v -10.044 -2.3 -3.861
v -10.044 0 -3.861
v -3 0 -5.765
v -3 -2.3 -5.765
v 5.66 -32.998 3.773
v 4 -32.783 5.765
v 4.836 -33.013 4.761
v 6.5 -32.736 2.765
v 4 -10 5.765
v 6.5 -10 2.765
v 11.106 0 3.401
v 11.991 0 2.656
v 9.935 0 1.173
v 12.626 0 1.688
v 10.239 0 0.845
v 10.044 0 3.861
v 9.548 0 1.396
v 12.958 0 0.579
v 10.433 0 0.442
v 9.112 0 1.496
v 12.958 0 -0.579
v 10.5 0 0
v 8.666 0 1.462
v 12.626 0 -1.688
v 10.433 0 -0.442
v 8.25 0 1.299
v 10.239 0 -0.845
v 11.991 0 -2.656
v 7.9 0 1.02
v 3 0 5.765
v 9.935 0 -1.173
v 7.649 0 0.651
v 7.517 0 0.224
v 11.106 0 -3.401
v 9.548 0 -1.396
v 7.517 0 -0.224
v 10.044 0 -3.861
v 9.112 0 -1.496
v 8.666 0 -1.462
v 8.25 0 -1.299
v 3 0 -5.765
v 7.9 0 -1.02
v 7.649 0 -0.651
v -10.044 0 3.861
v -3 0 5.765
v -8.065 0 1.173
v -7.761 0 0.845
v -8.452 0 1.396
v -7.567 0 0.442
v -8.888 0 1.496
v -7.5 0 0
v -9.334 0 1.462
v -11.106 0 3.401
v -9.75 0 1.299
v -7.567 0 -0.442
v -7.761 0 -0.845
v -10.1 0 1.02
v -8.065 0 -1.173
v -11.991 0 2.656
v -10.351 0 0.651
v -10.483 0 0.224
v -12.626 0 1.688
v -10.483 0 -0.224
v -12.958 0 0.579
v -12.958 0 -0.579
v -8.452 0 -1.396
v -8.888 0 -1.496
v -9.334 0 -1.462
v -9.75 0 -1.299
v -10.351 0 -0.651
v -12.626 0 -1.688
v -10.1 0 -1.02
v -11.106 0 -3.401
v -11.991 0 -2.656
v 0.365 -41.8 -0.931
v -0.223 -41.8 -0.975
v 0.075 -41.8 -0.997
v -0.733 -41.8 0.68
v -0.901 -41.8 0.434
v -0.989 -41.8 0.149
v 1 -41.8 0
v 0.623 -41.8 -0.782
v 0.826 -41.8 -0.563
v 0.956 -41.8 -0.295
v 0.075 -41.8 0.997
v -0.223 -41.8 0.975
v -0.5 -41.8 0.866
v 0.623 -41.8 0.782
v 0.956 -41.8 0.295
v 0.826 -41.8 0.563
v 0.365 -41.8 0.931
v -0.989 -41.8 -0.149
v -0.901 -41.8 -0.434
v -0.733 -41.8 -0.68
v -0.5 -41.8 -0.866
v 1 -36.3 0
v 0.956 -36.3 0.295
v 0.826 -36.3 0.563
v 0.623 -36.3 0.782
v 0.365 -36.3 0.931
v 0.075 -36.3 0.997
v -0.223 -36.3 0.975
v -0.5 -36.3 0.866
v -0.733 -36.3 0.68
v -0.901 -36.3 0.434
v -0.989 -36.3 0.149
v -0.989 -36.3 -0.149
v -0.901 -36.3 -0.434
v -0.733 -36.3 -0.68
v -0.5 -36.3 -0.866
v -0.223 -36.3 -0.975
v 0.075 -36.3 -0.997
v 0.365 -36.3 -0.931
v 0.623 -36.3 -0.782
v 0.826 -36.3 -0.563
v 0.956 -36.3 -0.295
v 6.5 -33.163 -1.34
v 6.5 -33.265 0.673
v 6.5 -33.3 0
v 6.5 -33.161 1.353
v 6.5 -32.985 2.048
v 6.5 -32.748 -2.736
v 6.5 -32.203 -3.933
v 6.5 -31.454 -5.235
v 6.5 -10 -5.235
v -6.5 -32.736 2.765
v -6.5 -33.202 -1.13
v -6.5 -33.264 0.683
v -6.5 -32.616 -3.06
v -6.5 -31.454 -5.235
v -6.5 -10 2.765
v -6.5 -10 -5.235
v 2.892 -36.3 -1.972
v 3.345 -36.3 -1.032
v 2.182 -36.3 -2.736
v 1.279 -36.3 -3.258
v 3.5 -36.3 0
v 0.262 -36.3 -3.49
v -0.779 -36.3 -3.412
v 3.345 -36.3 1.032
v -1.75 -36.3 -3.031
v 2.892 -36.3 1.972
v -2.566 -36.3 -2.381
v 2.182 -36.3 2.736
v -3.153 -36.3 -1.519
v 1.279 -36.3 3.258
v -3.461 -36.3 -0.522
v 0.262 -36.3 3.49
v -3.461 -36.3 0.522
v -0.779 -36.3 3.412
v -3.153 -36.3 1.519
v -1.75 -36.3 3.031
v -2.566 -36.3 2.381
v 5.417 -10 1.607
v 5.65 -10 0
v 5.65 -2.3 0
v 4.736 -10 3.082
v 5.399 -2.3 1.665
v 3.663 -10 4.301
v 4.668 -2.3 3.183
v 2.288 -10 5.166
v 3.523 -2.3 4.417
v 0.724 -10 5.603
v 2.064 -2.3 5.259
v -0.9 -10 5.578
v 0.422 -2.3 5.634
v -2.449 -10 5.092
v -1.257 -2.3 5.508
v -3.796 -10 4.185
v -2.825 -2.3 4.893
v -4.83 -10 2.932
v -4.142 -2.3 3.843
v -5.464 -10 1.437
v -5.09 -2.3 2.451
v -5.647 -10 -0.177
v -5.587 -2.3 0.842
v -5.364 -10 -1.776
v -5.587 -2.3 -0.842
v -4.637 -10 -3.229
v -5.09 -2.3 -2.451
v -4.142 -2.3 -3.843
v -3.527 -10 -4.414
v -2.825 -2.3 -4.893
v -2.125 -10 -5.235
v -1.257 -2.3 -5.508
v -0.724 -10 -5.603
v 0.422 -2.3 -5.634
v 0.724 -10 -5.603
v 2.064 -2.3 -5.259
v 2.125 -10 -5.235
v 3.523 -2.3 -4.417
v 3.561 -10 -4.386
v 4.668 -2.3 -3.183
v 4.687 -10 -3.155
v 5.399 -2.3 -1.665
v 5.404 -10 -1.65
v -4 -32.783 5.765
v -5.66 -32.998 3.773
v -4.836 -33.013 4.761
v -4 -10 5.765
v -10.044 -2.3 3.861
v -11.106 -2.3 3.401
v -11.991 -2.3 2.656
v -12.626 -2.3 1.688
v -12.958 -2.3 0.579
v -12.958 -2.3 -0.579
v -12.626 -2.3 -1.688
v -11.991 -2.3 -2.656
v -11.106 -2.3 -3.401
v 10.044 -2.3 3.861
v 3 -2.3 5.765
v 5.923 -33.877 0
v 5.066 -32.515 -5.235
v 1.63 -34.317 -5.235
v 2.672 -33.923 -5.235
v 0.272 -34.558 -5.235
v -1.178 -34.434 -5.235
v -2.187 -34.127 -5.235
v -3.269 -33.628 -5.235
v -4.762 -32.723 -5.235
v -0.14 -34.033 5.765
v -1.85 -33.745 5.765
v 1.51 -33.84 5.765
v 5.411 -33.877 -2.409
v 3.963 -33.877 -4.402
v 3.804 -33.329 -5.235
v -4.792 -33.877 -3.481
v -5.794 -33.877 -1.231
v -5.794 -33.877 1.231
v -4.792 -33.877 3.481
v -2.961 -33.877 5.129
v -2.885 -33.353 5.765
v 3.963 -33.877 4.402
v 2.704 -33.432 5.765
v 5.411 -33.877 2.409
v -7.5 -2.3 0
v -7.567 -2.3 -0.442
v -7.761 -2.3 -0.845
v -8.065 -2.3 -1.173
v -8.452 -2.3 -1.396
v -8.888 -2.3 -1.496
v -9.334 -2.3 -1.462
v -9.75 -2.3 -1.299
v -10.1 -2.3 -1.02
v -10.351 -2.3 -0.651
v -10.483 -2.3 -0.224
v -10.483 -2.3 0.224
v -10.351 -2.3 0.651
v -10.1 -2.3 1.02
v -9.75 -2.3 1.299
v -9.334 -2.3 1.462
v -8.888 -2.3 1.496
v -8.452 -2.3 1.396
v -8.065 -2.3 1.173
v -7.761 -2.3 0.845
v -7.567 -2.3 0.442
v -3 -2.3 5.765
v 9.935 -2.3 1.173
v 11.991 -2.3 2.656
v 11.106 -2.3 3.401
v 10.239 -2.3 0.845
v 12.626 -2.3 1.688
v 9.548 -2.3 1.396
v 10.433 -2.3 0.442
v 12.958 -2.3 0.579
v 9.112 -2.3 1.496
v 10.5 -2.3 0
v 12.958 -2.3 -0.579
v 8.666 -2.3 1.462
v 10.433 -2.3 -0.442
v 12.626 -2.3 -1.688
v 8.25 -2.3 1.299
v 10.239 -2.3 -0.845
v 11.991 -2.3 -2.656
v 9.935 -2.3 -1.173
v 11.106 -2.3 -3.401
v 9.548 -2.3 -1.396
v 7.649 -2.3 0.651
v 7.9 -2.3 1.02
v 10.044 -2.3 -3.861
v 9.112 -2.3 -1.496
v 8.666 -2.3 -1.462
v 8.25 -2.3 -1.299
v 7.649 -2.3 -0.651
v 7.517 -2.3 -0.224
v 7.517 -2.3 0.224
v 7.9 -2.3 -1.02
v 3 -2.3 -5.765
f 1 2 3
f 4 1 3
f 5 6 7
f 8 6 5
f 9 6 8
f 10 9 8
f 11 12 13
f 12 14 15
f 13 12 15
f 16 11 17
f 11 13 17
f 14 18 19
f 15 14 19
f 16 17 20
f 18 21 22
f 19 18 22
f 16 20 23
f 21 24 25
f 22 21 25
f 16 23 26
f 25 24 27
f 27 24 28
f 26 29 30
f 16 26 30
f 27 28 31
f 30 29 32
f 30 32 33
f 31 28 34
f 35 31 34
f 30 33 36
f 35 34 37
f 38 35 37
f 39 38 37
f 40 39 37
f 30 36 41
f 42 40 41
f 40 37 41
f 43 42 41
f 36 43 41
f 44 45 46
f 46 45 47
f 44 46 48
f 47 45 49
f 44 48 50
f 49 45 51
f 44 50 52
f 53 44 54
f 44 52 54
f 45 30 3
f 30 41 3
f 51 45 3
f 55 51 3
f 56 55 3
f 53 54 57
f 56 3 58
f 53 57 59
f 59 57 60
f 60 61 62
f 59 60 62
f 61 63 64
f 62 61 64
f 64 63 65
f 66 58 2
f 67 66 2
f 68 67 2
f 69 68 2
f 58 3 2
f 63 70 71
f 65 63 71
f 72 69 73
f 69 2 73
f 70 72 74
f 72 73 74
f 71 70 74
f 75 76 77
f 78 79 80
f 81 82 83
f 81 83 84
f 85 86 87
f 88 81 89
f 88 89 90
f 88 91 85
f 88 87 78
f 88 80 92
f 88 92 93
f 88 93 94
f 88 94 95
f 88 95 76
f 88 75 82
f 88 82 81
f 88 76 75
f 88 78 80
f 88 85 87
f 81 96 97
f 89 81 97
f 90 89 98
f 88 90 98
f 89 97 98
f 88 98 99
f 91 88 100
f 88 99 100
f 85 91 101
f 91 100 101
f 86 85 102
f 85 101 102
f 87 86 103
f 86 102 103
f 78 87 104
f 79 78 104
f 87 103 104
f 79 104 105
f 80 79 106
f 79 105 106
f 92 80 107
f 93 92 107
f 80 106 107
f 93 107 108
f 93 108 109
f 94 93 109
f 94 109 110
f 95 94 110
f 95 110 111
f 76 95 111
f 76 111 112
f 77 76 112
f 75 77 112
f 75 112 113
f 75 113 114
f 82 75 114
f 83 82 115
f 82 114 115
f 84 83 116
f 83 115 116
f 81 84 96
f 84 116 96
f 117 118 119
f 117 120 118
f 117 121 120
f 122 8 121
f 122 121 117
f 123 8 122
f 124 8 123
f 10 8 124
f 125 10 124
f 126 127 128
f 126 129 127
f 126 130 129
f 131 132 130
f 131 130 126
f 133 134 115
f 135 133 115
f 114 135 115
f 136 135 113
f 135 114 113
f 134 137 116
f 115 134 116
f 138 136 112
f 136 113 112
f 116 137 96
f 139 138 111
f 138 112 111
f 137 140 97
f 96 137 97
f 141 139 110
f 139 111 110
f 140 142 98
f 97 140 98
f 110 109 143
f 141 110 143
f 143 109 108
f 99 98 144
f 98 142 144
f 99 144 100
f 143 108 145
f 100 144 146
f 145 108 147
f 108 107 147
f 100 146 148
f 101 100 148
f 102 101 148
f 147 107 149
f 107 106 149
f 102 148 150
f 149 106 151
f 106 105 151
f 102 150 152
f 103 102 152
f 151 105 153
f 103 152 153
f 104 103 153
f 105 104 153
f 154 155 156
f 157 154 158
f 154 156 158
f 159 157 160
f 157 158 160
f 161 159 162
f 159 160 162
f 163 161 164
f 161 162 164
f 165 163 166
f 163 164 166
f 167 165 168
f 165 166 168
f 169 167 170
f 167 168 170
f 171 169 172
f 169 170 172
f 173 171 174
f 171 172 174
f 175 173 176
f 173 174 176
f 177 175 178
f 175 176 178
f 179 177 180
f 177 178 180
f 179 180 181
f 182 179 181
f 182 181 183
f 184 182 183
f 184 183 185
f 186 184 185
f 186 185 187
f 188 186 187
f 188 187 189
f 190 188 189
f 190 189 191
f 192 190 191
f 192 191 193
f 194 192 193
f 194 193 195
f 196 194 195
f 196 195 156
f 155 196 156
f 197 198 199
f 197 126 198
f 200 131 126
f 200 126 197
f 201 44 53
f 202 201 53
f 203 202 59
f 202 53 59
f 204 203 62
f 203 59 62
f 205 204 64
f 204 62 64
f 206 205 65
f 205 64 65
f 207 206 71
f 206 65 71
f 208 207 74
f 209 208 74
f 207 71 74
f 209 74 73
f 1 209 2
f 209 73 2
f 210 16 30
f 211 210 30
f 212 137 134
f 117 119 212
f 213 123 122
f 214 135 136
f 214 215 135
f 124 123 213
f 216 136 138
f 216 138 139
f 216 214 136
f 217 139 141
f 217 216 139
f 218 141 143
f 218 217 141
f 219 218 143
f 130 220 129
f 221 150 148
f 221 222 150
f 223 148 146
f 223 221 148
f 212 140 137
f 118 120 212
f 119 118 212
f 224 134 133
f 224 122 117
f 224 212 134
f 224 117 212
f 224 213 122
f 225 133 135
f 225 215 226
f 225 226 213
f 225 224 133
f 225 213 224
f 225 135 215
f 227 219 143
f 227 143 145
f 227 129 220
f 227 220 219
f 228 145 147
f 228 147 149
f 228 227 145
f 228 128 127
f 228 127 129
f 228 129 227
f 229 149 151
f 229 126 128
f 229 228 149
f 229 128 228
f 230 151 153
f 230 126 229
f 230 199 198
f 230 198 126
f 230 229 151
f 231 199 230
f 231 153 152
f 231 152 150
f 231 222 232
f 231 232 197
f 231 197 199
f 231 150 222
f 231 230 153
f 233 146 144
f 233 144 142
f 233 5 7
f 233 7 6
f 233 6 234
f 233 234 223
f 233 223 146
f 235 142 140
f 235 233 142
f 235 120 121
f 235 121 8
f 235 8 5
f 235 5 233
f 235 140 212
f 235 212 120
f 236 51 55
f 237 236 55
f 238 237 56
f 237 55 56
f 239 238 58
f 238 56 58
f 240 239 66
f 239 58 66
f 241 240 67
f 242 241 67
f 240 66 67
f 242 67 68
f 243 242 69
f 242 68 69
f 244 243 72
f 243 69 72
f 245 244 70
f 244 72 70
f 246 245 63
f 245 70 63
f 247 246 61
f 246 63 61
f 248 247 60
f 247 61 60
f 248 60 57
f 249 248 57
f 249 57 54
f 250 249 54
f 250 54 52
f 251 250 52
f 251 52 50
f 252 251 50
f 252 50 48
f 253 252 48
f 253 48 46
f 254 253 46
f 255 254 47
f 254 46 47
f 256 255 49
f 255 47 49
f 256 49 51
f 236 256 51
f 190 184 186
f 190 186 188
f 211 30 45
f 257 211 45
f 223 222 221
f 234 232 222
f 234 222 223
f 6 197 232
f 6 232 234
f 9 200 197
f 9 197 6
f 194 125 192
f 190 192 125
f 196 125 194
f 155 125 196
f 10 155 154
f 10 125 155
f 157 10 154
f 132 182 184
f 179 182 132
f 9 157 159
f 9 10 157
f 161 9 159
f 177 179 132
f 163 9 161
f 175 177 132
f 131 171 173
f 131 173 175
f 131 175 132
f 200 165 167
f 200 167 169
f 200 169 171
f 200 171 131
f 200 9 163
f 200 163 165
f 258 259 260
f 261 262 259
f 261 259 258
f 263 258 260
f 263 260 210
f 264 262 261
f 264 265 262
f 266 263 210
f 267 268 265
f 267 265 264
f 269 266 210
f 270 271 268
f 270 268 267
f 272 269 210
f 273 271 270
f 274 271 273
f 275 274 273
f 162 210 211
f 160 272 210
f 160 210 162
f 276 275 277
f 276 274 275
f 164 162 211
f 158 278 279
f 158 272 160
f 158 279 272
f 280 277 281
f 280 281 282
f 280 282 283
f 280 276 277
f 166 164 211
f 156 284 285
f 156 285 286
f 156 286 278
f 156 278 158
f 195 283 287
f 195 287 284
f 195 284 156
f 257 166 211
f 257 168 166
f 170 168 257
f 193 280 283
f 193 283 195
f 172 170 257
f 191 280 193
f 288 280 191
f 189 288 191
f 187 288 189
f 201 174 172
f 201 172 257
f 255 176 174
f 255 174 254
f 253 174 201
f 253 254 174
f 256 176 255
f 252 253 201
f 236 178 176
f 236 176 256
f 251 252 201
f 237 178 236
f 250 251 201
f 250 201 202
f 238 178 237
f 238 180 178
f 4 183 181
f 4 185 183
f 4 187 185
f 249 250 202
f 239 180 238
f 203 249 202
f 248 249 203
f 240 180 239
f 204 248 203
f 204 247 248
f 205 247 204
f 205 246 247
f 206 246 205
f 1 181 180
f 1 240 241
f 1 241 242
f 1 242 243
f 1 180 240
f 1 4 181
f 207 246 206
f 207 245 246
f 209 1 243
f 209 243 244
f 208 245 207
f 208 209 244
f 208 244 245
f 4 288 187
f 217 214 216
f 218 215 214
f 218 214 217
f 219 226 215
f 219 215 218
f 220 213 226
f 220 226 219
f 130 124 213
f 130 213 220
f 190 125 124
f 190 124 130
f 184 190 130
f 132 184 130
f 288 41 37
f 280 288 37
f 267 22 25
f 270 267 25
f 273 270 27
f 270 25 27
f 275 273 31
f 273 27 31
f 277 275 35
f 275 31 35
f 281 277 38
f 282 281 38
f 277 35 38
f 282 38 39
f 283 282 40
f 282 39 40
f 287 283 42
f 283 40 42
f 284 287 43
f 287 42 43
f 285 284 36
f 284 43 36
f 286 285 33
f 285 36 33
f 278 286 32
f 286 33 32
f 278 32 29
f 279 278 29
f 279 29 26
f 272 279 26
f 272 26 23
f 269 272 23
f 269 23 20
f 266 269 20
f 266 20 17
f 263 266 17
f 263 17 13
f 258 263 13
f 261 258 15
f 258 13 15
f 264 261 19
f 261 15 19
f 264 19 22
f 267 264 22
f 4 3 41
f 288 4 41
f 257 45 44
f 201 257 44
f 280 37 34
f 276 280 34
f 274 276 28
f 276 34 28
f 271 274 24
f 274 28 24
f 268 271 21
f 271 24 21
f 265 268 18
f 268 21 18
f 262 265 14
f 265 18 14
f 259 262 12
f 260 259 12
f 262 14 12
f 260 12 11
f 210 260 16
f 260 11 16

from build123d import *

# Parameters (mm, degrees)
SKETCH1_R           = 1.5
BOSS_EXTRUDE1_DEPTH = 2.3
SKETCH2_R           = 5.65
BOSS_EXTRUDE2_DEPTH = 7.7
BOSS_EXTRUDE3_DEPTH = 26.3
SKETCH5_R           = 1
BOSS_EXTRUDE4_DEPTH = 5.5


with BuildPart() as part:
    # Sketch1 → Boss-Extrude1 (new body)
    with BuildSketch(Plane(origin=(0, 0, 0), x_dir=(1, 0, 0), z_dir=(0, 1, 0))):
        with BuildLine():
            Line((-3, 5.765), (3, 5.765))
            Line((3, 5.765), (10.043565082, 3.861472766))
            ThreePointArc((10.043565082, 3.861472766), (13, 0), (10.043565082, -3.861472766))
            Line((10.043565082, -3.861472766), (3, -5.765))
            Line((3, -5.765), (-3, -5.765))
            Line((-3, -5.765), (-10.043565082, -3.861472766))
            ThreePointArc((-10.043565082, -3.861472766), (-13, 0), (-10.043565082, 3.861472766))
            Line((-10.043565082, 3.861472766), (-3, 5.765))
        make_face()
        with Locations((9, 0)):
            Circle(SKETCH1_R, mode=Mode.SUBTRACT)
        with Locations((-9, 0)):
            Circle(SKETCH1_R, mode=Mode.SUBTRACT)
    extrude(amount=-BOSS_EXTRUDE1_DEPTH)

    # Sketch2 → Boss-Extrude2 (add)
    with BuildSketch(Plane.XZ.offset(2.3)):
        Circle(SKETCH2_R)
    extrude(amount=BOSS_EXTRUDE2_DEPTH)

    # Sketch3 → Boss-Extrude3 (add)
    with BuildSketch(Plane.XZ.offset(10)):
        Polygon((-4, 5.765), (4, 5.765), (6.5, 2.765), (6.5, -5.235), (-6.5, -5.235), (-6.5, 2.765), align=None)
    extrude(amount=BOSS_EXTRUDE3_DEPTH)

    # Sketch4 → Cut-Revolve1 (revolve, cut)
    with BuildSketch(Plane.XY):
        Polygon((3.5, -36.3), (10, -29.8), (10, -36.3), align=None)
    revolve(axis=Axis((0, -36.3, 0), (0, 1, 0)), mode=Mode.SUBTRACT)

    # Sketch5 → Boss-Extrude4 (add)
    with BuildSketch(Plane.XZ.offset(36.3)):
        Circle(SKETCH5_R)
    extrude(amount=BOSS_EXTRUDE4_DEPTH)


solid = part.part
